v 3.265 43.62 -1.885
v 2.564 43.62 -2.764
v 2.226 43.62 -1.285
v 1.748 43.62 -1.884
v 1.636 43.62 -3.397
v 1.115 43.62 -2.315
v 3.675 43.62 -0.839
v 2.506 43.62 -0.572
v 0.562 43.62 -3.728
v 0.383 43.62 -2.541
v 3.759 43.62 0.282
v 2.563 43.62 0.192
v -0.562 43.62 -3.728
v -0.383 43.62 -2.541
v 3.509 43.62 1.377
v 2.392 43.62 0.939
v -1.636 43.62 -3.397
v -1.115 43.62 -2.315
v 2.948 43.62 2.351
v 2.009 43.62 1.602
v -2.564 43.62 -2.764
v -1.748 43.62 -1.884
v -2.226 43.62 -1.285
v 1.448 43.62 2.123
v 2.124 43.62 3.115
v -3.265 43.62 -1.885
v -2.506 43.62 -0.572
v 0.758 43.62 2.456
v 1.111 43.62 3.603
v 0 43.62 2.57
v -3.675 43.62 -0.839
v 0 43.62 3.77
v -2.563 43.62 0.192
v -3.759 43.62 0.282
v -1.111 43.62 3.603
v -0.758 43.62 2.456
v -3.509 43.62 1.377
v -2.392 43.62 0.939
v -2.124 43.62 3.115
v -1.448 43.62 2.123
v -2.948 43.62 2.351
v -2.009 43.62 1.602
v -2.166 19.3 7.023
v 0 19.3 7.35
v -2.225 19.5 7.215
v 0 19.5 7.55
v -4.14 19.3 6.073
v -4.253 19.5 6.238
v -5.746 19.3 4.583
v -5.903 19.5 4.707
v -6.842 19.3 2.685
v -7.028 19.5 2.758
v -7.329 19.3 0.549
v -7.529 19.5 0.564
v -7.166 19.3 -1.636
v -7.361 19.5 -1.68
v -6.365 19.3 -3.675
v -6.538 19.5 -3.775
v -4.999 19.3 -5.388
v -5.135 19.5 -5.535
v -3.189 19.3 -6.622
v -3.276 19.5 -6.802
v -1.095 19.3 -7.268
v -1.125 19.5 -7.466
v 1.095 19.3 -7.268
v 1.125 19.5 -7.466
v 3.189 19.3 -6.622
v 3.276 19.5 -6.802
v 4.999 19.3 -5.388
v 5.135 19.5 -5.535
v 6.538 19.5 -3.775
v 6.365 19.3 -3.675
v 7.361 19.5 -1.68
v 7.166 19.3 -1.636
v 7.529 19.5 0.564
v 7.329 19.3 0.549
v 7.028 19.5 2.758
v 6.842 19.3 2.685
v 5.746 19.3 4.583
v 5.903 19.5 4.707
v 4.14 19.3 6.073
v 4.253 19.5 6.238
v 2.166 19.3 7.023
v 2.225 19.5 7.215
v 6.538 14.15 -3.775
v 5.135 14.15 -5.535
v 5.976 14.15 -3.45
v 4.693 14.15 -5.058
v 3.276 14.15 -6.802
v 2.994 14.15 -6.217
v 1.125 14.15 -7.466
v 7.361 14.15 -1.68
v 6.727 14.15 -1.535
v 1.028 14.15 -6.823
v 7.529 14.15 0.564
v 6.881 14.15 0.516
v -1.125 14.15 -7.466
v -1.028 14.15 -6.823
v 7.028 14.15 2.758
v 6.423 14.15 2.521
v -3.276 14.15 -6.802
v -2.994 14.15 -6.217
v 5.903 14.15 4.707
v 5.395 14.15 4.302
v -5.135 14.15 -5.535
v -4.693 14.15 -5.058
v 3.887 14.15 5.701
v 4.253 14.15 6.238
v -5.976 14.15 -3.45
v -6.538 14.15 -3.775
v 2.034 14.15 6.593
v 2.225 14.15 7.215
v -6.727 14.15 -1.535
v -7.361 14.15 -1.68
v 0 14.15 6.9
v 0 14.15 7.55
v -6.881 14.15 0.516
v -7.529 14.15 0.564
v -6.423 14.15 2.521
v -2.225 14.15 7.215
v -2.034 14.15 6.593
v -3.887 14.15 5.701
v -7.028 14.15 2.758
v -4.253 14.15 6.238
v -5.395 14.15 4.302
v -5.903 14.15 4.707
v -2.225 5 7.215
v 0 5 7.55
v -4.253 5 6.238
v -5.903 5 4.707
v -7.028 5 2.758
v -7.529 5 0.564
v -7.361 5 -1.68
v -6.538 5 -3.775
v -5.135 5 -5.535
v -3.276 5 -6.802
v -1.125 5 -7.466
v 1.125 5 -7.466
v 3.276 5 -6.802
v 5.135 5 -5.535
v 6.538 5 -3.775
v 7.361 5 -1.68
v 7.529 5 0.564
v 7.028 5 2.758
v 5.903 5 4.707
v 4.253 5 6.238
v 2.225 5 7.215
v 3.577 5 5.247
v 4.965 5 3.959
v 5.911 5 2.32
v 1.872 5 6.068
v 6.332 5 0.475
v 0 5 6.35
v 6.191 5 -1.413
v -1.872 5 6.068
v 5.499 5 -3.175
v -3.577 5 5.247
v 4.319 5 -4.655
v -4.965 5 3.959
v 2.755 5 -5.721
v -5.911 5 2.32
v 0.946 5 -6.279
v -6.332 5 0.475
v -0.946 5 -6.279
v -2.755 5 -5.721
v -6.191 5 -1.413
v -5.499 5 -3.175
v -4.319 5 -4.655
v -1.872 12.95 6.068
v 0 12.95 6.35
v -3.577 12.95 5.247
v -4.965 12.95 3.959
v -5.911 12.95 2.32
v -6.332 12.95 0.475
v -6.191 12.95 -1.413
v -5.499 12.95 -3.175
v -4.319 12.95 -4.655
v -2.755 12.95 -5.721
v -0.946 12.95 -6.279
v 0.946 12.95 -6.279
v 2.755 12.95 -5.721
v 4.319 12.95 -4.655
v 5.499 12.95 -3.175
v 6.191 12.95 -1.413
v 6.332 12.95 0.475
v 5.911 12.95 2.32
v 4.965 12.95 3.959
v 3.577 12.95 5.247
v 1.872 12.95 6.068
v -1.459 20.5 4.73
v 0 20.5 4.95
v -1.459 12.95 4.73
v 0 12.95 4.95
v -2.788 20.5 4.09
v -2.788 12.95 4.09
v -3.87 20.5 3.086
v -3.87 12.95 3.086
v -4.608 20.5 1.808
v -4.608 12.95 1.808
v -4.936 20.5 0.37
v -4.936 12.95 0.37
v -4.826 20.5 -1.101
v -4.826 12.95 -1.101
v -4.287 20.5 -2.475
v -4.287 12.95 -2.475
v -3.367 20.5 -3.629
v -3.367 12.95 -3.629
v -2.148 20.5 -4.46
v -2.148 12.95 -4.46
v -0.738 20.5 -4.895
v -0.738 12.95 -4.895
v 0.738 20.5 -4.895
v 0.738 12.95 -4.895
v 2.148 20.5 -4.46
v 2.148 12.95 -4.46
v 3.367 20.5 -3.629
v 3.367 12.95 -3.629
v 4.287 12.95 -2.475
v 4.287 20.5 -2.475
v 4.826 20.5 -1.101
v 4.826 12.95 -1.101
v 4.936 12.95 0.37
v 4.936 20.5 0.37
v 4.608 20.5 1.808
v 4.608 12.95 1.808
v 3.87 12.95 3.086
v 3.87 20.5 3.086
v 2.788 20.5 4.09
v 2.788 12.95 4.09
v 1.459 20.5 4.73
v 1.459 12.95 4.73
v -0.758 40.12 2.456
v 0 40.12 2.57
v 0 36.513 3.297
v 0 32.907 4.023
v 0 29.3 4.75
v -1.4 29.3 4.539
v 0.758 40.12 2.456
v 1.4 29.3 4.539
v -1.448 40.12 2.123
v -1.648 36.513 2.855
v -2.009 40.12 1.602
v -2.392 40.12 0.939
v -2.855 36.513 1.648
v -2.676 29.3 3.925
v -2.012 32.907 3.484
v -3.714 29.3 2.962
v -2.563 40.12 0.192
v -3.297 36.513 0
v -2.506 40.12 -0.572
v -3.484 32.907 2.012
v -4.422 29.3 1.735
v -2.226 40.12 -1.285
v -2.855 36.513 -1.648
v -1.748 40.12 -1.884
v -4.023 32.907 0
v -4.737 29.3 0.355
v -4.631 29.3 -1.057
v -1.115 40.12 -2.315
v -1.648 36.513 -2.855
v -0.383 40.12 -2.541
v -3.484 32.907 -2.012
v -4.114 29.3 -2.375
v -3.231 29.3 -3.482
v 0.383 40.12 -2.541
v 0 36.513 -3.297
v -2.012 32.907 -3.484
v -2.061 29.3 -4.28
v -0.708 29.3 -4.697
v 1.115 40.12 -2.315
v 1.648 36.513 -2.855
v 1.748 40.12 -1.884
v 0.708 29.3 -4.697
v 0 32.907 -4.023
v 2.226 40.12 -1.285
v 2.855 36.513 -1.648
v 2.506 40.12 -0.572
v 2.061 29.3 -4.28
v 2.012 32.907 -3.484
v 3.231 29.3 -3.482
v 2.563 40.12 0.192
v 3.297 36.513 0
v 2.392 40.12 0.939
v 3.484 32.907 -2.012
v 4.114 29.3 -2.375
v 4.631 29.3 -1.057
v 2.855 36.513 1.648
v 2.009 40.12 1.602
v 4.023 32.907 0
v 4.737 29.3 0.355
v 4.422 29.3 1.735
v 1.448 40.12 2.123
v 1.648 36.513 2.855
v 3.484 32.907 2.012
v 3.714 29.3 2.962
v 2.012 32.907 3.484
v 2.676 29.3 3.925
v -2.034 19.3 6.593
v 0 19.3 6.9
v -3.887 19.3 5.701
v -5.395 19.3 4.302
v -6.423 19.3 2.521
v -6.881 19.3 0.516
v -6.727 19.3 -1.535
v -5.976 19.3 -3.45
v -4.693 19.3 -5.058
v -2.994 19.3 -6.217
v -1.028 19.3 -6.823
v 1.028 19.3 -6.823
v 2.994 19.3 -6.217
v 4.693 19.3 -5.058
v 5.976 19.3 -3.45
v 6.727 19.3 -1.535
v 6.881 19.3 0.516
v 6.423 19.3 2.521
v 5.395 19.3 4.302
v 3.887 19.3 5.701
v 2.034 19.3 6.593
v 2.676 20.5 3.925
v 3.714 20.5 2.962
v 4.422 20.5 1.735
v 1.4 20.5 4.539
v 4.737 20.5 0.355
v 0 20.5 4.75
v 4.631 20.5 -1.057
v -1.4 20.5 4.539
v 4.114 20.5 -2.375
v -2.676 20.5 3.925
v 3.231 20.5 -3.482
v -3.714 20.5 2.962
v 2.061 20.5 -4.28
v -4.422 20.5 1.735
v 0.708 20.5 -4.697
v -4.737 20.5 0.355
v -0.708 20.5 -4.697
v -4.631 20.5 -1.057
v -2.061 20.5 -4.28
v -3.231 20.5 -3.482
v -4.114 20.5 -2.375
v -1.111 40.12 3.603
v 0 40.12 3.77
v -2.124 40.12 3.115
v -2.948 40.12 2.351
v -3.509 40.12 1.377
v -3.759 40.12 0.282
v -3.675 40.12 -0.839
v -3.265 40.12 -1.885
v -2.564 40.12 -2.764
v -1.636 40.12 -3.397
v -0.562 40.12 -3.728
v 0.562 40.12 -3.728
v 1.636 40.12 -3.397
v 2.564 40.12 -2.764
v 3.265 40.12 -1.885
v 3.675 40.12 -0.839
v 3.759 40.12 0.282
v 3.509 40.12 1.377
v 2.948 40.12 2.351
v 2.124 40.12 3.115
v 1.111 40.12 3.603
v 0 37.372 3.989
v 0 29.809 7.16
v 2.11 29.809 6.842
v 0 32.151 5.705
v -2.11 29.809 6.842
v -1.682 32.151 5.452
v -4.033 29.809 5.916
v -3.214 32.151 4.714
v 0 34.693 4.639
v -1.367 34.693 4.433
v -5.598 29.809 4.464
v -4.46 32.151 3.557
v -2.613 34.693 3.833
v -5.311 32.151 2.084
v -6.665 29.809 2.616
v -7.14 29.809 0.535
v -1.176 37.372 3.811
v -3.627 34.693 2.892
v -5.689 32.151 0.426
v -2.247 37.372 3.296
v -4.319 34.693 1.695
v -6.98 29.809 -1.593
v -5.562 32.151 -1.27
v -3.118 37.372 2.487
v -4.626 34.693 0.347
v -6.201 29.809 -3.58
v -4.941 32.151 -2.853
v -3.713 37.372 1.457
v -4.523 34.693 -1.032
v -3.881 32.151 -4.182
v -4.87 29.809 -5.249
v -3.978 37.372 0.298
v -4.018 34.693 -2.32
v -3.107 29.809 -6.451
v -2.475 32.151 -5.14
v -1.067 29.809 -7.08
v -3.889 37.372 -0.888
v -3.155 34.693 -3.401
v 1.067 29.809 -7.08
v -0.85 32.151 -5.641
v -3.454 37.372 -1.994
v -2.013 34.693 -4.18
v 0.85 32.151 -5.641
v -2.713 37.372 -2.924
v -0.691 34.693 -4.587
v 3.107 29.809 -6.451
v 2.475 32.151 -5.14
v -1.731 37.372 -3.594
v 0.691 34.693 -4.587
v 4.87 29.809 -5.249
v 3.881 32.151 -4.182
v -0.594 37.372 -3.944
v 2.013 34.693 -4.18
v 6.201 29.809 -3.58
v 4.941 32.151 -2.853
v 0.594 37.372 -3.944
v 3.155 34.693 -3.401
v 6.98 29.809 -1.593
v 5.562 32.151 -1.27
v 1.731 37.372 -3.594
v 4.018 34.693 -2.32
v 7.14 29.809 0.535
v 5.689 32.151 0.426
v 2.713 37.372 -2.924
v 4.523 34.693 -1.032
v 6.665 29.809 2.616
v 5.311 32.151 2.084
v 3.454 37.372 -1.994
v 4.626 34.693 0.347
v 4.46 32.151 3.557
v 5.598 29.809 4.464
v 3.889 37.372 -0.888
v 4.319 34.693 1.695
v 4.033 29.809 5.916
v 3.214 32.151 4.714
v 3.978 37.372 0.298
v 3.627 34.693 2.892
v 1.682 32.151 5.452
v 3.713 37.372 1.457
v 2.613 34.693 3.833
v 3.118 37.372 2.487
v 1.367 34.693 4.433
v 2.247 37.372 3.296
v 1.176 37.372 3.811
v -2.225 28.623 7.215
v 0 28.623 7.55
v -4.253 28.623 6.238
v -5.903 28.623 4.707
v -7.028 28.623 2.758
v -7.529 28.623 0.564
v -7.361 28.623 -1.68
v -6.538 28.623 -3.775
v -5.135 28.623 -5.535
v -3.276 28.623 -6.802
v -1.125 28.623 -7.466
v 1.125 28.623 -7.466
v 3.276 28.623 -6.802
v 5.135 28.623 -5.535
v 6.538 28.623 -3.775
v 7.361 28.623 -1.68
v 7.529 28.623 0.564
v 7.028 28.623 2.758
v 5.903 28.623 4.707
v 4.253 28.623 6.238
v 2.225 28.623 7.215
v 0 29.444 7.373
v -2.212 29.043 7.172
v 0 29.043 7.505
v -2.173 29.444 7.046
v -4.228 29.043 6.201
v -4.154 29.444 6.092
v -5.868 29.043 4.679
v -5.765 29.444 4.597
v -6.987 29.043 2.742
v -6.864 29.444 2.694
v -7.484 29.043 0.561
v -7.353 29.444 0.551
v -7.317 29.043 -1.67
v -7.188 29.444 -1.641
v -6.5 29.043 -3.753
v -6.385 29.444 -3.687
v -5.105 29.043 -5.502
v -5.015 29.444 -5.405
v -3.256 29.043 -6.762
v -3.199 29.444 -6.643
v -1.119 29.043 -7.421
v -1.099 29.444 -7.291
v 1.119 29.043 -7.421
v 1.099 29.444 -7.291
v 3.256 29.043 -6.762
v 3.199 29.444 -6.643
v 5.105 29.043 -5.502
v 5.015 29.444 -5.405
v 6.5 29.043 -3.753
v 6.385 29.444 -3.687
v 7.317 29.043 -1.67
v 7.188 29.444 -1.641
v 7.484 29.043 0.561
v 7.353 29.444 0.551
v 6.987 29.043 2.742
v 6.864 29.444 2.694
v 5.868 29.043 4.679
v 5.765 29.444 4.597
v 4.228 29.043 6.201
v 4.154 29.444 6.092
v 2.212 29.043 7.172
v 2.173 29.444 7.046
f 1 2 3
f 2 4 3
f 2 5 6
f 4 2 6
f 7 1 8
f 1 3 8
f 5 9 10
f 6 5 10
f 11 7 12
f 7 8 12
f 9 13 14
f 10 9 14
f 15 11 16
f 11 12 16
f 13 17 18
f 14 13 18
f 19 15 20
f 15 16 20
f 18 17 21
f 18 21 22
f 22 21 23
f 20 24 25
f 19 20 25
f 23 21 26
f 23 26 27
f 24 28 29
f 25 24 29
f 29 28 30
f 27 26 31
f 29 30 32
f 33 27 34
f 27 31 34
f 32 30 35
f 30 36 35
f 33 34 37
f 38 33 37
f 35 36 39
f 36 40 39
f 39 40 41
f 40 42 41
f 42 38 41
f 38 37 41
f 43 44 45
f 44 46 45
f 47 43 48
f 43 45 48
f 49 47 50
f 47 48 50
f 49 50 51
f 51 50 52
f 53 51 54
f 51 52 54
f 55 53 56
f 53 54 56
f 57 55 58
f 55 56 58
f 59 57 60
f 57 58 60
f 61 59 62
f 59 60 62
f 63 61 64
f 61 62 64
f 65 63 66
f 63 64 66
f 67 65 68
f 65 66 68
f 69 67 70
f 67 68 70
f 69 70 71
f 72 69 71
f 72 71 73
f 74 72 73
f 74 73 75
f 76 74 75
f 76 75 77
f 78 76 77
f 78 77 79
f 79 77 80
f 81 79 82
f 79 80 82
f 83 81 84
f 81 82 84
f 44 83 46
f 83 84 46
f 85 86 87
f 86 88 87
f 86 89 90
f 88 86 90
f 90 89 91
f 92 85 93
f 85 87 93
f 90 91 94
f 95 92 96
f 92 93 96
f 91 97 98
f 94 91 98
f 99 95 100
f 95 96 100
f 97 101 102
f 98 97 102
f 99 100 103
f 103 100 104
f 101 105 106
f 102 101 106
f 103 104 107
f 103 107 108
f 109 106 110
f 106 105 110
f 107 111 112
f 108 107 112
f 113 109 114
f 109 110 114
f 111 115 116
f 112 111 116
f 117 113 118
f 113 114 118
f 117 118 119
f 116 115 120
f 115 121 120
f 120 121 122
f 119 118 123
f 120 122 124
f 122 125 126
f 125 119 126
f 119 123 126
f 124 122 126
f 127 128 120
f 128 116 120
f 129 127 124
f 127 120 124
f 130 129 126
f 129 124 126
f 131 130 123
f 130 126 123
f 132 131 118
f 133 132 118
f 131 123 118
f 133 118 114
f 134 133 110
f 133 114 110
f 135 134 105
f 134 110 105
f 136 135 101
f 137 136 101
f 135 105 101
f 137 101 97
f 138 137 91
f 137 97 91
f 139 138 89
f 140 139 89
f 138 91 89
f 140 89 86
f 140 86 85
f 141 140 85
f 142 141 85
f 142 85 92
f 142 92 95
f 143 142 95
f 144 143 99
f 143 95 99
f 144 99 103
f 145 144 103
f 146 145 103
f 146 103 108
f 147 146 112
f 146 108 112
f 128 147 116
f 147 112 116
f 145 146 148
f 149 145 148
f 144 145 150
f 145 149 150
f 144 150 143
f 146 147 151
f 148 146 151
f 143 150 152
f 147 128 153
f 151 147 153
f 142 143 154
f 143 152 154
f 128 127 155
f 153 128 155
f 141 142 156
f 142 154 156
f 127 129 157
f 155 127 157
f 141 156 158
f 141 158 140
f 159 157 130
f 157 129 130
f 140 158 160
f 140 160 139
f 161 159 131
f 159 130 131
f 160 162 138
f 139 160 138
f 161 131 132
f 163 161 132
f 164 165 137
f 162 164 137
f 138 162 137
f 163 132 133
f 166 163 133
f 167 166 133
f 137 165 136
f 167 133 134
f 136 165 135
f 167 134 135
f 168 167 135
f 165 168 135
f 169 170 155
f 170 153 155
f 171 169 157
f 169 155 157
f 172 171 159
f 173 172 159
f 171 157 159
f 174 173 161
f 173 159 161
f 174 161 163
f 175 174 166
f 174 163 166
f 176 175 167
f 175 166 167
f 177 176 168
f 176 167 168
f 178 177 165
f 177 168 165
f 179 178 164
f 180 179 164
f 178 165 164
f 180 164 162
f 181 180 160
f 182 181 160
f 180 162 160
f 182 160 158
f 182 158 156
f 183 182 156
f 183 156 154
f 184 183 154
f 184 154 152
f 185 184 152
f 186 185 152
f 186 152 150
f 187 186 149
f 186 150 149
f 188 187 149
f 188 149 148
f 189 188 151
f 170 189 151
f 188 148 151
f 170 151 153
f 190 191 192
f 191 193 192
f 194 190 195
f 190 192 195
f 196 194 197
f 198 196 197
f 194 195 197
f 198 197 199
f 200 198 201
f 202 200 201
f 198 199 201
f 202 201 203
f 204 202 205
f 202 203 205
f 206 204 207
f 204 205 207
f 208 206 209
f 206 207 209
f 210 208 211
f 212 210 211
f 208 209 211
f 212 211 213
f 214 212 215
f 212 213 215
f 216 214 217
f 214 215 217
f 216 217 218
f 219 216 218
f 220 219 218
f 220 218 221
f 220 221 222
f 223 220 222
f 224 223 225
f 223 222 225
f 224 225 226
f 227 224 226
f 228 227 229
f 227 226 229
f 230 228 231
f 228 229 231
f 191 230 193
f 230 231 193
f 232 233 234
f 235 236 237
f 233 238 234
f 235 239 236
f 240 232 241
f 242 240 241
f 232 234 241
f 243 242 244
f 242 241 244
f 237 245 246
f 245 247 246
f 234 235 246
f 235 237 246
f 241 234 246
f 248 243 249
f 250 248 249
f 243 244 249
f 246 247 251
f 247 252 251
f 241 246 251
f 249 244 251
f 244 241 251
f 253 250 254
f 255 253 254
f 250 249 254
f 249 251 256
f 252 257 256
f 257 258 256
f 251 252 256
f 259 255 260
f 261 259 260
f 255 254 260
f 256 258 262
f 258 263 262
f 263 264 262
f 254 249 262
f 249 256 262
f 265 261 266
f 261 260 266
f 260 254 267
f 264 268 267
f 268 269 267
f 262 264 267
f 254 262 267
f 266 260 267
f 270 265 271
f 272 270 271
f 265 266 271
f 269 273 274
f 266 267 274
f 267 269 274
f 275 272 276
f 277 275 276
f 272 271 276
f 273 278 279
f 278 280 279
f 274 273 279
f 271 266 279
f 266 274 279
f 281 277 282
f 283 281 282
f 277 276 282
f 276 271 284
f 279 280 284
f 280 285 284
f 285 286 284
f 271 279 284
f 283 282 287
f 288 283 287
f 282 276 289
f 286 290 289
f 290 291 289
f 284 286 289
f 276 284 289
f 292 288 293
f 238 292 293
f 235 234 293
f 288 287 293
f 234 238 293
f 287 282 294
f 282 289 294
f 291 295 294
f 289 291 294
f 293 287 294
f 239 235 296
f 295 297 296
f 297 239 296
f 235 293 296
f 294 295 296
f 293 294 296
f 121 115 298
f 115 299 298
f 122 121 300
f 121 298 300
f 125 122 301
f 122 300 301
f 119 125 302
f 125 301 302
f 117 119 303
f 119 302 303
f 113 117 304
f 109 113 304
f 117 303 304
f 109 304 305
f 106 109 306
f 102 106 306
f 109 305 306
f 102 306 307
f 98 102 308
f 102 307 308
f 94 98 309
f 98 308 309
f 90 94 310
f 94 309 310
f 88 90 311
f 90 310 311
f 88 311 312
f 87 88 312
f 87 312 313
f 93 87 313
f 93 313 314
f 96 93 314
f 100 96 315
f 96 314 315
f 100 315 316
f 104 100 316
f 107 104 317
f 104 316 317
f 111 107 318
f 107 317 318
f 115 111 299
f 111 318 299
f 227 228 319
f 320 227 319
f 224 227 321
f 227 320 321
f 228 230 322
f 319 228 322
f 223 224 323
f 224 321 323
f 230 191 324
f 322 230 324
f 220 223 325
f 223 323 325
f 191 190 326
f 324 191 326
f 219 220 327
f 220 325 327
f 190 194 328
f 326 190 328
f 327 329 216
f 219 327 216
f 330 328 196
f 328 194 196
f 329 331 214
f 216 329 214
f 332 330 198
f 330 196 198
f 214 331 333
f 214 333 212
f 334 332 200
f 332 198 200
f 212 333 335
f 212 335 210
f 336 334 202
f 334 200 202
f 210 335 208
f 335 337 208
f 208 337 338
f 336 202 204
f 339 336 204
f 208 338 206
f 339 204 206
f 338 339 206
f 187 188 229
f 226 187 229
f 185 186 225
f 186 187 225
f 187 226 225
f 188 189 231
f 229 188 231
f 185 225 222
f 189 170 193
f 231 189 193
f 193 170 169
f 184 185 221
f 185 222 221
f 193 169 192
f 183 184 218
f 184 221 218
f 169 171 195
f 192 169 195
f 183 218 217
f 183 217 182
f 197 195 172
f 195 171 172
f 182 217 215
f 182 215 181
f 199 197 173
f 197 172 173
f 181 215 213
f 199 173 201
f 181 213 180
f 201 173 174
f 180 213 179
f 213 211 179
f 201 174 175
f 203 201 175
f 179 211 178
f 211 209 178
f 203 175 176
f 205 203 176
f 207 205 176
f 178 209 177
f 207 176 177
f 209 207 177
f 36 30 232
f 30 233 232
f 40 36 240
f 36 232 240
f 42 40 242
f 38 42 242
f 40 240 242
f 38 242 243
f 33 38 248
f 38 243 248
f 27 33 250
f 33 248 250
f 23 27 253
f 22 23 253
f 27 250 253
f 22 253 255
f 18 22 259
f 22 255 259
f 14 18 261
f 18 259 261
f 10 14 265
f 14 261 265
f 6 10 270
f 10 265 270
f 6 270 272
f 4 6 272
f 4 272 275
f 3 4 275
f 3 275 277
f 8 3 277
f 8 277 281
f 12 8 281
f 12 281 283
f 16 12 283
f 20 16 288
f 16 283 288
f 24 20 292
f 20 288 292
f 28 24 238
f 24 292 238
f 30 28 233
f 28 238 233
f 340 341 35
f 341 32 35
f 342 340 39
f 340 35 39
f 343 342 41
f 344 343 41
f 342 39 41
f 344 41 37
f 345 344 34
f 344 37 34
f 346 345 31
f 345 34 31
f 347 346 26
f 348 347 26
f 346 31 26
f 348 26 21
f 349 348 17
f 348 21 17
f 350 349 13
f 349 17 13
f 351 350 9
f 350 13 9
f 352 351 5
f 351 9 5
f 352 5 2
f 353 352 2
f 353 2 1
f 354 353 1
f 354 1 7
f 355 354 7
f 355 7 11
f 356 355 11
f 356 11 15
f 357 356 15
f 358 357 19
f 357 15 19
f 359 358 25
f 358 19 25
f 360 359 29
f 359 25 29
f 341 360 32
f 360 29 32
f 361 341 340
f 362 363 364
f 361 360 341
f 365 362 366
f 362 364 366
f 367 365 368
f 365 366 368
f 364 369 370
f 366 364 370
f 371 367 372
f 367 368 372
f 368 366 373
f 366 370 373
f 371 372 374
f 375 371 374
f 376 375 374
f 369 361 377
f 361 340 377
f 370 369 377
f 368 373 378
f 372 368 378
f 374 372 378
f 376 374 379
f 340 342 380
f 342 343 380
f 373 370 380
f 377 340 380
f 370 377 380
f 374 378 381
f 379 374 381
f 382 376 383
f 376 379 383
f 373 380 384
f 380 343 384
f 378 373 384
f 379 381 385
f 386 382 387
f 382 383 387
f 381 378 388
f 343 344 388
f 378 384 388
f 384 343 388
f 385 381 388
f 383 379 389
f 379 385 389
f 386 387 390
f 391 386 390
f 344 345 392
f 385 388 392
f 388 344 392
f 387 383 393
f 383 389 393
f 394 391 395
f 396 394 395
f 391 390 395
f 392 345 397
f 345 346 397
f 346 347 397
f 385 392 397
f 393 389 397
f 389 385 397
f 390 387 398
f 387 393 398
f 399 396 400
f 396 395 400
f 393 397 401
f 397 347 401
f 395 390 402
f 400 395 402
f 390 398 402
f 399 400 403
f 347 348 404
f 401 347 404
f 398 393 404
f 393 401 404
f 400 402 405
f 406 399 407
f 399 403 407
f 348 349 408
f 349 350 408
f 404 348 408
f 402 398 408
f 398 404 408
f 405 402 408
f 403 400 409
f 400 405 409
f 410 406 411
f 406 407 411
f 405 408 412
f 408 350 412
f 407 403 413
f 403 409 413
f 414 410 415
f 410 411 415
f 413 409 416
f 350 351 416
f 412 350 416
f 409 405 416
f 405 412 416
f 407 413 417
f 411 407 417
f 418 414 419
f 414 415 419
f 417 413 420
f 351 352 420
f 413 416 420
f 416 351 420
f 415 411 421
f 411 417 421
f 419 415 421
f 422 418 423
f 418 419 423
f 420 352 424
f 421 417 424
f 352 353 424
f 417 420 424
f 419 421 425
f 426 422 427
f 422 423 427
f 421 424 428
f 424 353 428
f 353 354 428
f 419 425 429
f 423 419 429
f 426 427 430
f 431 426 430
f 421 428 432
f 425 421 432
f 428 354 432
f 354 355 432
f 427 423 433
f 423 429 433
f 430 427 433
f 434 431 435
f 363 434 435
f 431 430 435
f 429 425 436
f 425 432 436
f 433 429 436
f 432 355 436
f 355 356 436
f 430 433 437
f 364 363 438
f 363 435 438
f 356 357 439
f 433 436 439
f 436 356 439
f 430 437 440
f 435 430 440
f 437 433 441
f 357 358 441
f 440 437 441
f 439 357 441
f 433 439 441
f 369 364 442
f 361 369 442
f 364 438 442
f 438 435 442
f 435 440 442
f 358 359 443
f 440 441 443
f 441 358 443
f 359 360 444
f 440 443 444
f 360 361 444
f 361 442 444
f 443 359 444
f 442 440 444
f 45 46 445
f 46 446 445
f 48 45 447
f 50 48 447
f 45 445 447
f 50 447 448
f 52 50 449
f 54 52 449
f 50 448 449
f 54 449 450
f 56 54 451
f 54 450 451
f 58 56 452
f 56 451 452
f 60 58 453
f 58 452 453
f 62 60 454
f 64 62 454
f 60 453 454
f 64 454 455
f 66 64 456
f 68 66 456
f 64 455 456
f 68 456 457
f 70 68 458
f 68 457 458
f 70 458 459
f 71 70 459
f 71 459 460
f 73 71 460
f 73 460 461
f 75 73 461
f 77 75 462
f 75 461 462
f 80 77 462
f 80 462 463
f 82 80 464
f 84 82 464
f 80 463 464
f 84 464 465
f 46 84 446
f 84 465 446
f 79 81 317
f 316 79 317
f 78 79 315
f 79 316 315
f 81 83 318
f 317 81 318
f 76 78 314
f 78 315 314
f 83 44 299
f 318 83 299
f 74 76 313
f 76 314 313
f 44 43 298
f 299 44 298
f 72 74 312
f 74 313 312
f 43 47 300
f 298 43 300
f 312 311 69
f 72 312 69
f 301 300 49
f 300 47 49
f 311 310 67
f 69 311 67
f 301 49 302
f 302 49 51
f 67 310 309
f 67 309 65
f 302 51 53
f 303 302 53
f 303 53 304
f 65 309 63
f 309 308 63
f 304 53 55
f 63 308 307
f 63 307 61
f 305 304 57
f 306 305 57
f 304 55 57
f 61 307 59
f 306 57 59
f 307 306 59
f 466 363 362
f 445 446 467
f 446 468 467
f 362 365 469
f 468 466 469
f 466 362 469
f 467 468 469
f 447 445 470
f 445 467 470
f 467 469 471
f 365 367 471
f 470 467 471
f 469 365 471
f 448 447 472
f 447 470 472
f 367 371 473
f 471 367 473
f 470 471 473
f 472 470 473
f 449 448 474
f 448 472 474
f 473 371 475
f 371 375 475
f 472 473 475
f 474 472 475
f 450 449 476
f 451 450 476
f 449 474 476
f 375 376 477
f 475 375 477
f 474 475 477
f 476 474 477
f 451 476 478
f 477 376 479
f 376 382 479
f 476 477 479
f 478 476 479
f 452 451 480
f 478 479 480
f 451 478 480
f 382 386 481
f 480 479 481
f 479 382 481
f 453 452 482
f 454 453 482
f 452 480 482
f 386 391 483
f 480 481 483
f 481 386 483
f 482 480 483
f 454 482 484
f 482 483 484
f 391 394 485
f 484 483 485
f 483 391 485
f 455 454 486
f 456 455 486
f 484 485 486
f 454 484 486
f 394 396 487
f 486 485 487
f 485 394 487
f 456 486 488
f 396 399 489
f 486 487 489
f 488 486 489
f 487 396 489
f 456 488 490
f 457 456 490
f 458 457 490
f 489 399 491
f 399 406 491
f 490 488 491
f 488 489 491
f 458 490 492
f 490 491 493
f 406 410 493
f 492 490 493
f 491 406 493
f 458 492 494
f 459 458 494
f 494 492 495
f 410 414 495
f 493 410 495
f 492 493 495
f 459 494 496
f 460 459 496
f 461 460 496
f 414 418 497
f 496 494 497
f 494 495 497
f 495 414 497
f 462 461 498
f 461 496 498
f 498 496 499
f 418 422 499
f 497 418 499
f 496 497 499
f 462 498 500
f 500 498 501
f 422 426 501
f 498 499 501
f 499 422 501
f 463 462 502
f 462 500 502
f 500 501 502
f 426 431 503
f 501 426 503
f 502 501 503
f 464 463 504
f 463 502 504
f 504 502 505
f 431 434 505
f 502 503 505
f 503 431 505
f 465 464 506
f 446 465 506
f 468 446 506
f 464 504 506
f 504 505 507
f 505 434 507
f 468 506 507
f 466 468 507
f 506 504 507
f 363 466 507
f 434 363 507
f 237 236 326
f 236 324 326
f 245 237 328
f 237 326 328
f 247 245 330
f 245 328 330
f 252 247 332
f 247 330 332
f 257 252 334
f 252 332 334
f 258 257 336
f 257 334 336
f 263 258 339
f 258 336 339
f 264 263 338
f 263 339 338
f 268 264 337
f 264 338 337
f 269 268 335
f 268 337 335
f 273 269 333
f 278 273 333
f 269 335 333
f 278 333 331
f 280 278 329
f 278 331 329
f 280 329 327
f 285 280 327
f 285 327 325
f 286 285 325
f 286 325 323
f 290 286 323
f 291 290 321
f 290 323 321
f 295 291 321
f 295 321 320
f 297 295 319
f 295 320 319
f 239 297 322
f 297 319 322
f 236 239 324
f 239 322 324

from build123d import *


with BuildPart() as part:
    # Sketch3 → Revolve1 (revolve)
    with BuildSketch(Plane.XY, mode=Mode.PRIVATE) as revolve1_sk:
        with BuildLine():
            Line((6.35, 12.95), (6.35, 5))
            Line((6.35, 5), (7.55, 5))
            Line((7.55, 5), (7.55, 14.15))
            Line((7.55, 14.15), (6.9, 14.15))
            Line((6.9, 14.15), (6.9, 19.3))
            Line((6.9, 19.3), (7.35, 19.3))
            Line((7.35, 19.3), (7.55, 19.5))
            Line((7.55, 19.5), (7.55, 28.622504621))
            ThreePointArc((7.55, 28.622504621), (7.449953131, 29.247146997), (7.159821902, 29.80929586))
            ThreePointArc((7.159821902, 29.80929586), (4.639195549, 34.693179743), (3.77, 40.12))
            Line((3.77, 40.12), (3.77, 43.62))
            Line((3.77, 43.62), (2.57, 43.62))
            Line((2.57, 43.62), (2.57, 40.12))
            Line((2.57, 40.12), (4.75, 29.3))
            Line((4.75, 29.3), (4.75, 20.5))
            Line((4.75, 20.5), (4.95, 20.5))
            Line((4.95, 20.5), (4.95, 12.95))
            Line((4.95, 12.95), (6.35, 12.95))
        make_face()
    revolve(revolve1_sk.sketch.rotate(Axis((0, 43.62, 0), (0, -1, 0)), 90), axis=Axis((0, 43.62, 0), (0, -1, 0)))


solid = part.part
